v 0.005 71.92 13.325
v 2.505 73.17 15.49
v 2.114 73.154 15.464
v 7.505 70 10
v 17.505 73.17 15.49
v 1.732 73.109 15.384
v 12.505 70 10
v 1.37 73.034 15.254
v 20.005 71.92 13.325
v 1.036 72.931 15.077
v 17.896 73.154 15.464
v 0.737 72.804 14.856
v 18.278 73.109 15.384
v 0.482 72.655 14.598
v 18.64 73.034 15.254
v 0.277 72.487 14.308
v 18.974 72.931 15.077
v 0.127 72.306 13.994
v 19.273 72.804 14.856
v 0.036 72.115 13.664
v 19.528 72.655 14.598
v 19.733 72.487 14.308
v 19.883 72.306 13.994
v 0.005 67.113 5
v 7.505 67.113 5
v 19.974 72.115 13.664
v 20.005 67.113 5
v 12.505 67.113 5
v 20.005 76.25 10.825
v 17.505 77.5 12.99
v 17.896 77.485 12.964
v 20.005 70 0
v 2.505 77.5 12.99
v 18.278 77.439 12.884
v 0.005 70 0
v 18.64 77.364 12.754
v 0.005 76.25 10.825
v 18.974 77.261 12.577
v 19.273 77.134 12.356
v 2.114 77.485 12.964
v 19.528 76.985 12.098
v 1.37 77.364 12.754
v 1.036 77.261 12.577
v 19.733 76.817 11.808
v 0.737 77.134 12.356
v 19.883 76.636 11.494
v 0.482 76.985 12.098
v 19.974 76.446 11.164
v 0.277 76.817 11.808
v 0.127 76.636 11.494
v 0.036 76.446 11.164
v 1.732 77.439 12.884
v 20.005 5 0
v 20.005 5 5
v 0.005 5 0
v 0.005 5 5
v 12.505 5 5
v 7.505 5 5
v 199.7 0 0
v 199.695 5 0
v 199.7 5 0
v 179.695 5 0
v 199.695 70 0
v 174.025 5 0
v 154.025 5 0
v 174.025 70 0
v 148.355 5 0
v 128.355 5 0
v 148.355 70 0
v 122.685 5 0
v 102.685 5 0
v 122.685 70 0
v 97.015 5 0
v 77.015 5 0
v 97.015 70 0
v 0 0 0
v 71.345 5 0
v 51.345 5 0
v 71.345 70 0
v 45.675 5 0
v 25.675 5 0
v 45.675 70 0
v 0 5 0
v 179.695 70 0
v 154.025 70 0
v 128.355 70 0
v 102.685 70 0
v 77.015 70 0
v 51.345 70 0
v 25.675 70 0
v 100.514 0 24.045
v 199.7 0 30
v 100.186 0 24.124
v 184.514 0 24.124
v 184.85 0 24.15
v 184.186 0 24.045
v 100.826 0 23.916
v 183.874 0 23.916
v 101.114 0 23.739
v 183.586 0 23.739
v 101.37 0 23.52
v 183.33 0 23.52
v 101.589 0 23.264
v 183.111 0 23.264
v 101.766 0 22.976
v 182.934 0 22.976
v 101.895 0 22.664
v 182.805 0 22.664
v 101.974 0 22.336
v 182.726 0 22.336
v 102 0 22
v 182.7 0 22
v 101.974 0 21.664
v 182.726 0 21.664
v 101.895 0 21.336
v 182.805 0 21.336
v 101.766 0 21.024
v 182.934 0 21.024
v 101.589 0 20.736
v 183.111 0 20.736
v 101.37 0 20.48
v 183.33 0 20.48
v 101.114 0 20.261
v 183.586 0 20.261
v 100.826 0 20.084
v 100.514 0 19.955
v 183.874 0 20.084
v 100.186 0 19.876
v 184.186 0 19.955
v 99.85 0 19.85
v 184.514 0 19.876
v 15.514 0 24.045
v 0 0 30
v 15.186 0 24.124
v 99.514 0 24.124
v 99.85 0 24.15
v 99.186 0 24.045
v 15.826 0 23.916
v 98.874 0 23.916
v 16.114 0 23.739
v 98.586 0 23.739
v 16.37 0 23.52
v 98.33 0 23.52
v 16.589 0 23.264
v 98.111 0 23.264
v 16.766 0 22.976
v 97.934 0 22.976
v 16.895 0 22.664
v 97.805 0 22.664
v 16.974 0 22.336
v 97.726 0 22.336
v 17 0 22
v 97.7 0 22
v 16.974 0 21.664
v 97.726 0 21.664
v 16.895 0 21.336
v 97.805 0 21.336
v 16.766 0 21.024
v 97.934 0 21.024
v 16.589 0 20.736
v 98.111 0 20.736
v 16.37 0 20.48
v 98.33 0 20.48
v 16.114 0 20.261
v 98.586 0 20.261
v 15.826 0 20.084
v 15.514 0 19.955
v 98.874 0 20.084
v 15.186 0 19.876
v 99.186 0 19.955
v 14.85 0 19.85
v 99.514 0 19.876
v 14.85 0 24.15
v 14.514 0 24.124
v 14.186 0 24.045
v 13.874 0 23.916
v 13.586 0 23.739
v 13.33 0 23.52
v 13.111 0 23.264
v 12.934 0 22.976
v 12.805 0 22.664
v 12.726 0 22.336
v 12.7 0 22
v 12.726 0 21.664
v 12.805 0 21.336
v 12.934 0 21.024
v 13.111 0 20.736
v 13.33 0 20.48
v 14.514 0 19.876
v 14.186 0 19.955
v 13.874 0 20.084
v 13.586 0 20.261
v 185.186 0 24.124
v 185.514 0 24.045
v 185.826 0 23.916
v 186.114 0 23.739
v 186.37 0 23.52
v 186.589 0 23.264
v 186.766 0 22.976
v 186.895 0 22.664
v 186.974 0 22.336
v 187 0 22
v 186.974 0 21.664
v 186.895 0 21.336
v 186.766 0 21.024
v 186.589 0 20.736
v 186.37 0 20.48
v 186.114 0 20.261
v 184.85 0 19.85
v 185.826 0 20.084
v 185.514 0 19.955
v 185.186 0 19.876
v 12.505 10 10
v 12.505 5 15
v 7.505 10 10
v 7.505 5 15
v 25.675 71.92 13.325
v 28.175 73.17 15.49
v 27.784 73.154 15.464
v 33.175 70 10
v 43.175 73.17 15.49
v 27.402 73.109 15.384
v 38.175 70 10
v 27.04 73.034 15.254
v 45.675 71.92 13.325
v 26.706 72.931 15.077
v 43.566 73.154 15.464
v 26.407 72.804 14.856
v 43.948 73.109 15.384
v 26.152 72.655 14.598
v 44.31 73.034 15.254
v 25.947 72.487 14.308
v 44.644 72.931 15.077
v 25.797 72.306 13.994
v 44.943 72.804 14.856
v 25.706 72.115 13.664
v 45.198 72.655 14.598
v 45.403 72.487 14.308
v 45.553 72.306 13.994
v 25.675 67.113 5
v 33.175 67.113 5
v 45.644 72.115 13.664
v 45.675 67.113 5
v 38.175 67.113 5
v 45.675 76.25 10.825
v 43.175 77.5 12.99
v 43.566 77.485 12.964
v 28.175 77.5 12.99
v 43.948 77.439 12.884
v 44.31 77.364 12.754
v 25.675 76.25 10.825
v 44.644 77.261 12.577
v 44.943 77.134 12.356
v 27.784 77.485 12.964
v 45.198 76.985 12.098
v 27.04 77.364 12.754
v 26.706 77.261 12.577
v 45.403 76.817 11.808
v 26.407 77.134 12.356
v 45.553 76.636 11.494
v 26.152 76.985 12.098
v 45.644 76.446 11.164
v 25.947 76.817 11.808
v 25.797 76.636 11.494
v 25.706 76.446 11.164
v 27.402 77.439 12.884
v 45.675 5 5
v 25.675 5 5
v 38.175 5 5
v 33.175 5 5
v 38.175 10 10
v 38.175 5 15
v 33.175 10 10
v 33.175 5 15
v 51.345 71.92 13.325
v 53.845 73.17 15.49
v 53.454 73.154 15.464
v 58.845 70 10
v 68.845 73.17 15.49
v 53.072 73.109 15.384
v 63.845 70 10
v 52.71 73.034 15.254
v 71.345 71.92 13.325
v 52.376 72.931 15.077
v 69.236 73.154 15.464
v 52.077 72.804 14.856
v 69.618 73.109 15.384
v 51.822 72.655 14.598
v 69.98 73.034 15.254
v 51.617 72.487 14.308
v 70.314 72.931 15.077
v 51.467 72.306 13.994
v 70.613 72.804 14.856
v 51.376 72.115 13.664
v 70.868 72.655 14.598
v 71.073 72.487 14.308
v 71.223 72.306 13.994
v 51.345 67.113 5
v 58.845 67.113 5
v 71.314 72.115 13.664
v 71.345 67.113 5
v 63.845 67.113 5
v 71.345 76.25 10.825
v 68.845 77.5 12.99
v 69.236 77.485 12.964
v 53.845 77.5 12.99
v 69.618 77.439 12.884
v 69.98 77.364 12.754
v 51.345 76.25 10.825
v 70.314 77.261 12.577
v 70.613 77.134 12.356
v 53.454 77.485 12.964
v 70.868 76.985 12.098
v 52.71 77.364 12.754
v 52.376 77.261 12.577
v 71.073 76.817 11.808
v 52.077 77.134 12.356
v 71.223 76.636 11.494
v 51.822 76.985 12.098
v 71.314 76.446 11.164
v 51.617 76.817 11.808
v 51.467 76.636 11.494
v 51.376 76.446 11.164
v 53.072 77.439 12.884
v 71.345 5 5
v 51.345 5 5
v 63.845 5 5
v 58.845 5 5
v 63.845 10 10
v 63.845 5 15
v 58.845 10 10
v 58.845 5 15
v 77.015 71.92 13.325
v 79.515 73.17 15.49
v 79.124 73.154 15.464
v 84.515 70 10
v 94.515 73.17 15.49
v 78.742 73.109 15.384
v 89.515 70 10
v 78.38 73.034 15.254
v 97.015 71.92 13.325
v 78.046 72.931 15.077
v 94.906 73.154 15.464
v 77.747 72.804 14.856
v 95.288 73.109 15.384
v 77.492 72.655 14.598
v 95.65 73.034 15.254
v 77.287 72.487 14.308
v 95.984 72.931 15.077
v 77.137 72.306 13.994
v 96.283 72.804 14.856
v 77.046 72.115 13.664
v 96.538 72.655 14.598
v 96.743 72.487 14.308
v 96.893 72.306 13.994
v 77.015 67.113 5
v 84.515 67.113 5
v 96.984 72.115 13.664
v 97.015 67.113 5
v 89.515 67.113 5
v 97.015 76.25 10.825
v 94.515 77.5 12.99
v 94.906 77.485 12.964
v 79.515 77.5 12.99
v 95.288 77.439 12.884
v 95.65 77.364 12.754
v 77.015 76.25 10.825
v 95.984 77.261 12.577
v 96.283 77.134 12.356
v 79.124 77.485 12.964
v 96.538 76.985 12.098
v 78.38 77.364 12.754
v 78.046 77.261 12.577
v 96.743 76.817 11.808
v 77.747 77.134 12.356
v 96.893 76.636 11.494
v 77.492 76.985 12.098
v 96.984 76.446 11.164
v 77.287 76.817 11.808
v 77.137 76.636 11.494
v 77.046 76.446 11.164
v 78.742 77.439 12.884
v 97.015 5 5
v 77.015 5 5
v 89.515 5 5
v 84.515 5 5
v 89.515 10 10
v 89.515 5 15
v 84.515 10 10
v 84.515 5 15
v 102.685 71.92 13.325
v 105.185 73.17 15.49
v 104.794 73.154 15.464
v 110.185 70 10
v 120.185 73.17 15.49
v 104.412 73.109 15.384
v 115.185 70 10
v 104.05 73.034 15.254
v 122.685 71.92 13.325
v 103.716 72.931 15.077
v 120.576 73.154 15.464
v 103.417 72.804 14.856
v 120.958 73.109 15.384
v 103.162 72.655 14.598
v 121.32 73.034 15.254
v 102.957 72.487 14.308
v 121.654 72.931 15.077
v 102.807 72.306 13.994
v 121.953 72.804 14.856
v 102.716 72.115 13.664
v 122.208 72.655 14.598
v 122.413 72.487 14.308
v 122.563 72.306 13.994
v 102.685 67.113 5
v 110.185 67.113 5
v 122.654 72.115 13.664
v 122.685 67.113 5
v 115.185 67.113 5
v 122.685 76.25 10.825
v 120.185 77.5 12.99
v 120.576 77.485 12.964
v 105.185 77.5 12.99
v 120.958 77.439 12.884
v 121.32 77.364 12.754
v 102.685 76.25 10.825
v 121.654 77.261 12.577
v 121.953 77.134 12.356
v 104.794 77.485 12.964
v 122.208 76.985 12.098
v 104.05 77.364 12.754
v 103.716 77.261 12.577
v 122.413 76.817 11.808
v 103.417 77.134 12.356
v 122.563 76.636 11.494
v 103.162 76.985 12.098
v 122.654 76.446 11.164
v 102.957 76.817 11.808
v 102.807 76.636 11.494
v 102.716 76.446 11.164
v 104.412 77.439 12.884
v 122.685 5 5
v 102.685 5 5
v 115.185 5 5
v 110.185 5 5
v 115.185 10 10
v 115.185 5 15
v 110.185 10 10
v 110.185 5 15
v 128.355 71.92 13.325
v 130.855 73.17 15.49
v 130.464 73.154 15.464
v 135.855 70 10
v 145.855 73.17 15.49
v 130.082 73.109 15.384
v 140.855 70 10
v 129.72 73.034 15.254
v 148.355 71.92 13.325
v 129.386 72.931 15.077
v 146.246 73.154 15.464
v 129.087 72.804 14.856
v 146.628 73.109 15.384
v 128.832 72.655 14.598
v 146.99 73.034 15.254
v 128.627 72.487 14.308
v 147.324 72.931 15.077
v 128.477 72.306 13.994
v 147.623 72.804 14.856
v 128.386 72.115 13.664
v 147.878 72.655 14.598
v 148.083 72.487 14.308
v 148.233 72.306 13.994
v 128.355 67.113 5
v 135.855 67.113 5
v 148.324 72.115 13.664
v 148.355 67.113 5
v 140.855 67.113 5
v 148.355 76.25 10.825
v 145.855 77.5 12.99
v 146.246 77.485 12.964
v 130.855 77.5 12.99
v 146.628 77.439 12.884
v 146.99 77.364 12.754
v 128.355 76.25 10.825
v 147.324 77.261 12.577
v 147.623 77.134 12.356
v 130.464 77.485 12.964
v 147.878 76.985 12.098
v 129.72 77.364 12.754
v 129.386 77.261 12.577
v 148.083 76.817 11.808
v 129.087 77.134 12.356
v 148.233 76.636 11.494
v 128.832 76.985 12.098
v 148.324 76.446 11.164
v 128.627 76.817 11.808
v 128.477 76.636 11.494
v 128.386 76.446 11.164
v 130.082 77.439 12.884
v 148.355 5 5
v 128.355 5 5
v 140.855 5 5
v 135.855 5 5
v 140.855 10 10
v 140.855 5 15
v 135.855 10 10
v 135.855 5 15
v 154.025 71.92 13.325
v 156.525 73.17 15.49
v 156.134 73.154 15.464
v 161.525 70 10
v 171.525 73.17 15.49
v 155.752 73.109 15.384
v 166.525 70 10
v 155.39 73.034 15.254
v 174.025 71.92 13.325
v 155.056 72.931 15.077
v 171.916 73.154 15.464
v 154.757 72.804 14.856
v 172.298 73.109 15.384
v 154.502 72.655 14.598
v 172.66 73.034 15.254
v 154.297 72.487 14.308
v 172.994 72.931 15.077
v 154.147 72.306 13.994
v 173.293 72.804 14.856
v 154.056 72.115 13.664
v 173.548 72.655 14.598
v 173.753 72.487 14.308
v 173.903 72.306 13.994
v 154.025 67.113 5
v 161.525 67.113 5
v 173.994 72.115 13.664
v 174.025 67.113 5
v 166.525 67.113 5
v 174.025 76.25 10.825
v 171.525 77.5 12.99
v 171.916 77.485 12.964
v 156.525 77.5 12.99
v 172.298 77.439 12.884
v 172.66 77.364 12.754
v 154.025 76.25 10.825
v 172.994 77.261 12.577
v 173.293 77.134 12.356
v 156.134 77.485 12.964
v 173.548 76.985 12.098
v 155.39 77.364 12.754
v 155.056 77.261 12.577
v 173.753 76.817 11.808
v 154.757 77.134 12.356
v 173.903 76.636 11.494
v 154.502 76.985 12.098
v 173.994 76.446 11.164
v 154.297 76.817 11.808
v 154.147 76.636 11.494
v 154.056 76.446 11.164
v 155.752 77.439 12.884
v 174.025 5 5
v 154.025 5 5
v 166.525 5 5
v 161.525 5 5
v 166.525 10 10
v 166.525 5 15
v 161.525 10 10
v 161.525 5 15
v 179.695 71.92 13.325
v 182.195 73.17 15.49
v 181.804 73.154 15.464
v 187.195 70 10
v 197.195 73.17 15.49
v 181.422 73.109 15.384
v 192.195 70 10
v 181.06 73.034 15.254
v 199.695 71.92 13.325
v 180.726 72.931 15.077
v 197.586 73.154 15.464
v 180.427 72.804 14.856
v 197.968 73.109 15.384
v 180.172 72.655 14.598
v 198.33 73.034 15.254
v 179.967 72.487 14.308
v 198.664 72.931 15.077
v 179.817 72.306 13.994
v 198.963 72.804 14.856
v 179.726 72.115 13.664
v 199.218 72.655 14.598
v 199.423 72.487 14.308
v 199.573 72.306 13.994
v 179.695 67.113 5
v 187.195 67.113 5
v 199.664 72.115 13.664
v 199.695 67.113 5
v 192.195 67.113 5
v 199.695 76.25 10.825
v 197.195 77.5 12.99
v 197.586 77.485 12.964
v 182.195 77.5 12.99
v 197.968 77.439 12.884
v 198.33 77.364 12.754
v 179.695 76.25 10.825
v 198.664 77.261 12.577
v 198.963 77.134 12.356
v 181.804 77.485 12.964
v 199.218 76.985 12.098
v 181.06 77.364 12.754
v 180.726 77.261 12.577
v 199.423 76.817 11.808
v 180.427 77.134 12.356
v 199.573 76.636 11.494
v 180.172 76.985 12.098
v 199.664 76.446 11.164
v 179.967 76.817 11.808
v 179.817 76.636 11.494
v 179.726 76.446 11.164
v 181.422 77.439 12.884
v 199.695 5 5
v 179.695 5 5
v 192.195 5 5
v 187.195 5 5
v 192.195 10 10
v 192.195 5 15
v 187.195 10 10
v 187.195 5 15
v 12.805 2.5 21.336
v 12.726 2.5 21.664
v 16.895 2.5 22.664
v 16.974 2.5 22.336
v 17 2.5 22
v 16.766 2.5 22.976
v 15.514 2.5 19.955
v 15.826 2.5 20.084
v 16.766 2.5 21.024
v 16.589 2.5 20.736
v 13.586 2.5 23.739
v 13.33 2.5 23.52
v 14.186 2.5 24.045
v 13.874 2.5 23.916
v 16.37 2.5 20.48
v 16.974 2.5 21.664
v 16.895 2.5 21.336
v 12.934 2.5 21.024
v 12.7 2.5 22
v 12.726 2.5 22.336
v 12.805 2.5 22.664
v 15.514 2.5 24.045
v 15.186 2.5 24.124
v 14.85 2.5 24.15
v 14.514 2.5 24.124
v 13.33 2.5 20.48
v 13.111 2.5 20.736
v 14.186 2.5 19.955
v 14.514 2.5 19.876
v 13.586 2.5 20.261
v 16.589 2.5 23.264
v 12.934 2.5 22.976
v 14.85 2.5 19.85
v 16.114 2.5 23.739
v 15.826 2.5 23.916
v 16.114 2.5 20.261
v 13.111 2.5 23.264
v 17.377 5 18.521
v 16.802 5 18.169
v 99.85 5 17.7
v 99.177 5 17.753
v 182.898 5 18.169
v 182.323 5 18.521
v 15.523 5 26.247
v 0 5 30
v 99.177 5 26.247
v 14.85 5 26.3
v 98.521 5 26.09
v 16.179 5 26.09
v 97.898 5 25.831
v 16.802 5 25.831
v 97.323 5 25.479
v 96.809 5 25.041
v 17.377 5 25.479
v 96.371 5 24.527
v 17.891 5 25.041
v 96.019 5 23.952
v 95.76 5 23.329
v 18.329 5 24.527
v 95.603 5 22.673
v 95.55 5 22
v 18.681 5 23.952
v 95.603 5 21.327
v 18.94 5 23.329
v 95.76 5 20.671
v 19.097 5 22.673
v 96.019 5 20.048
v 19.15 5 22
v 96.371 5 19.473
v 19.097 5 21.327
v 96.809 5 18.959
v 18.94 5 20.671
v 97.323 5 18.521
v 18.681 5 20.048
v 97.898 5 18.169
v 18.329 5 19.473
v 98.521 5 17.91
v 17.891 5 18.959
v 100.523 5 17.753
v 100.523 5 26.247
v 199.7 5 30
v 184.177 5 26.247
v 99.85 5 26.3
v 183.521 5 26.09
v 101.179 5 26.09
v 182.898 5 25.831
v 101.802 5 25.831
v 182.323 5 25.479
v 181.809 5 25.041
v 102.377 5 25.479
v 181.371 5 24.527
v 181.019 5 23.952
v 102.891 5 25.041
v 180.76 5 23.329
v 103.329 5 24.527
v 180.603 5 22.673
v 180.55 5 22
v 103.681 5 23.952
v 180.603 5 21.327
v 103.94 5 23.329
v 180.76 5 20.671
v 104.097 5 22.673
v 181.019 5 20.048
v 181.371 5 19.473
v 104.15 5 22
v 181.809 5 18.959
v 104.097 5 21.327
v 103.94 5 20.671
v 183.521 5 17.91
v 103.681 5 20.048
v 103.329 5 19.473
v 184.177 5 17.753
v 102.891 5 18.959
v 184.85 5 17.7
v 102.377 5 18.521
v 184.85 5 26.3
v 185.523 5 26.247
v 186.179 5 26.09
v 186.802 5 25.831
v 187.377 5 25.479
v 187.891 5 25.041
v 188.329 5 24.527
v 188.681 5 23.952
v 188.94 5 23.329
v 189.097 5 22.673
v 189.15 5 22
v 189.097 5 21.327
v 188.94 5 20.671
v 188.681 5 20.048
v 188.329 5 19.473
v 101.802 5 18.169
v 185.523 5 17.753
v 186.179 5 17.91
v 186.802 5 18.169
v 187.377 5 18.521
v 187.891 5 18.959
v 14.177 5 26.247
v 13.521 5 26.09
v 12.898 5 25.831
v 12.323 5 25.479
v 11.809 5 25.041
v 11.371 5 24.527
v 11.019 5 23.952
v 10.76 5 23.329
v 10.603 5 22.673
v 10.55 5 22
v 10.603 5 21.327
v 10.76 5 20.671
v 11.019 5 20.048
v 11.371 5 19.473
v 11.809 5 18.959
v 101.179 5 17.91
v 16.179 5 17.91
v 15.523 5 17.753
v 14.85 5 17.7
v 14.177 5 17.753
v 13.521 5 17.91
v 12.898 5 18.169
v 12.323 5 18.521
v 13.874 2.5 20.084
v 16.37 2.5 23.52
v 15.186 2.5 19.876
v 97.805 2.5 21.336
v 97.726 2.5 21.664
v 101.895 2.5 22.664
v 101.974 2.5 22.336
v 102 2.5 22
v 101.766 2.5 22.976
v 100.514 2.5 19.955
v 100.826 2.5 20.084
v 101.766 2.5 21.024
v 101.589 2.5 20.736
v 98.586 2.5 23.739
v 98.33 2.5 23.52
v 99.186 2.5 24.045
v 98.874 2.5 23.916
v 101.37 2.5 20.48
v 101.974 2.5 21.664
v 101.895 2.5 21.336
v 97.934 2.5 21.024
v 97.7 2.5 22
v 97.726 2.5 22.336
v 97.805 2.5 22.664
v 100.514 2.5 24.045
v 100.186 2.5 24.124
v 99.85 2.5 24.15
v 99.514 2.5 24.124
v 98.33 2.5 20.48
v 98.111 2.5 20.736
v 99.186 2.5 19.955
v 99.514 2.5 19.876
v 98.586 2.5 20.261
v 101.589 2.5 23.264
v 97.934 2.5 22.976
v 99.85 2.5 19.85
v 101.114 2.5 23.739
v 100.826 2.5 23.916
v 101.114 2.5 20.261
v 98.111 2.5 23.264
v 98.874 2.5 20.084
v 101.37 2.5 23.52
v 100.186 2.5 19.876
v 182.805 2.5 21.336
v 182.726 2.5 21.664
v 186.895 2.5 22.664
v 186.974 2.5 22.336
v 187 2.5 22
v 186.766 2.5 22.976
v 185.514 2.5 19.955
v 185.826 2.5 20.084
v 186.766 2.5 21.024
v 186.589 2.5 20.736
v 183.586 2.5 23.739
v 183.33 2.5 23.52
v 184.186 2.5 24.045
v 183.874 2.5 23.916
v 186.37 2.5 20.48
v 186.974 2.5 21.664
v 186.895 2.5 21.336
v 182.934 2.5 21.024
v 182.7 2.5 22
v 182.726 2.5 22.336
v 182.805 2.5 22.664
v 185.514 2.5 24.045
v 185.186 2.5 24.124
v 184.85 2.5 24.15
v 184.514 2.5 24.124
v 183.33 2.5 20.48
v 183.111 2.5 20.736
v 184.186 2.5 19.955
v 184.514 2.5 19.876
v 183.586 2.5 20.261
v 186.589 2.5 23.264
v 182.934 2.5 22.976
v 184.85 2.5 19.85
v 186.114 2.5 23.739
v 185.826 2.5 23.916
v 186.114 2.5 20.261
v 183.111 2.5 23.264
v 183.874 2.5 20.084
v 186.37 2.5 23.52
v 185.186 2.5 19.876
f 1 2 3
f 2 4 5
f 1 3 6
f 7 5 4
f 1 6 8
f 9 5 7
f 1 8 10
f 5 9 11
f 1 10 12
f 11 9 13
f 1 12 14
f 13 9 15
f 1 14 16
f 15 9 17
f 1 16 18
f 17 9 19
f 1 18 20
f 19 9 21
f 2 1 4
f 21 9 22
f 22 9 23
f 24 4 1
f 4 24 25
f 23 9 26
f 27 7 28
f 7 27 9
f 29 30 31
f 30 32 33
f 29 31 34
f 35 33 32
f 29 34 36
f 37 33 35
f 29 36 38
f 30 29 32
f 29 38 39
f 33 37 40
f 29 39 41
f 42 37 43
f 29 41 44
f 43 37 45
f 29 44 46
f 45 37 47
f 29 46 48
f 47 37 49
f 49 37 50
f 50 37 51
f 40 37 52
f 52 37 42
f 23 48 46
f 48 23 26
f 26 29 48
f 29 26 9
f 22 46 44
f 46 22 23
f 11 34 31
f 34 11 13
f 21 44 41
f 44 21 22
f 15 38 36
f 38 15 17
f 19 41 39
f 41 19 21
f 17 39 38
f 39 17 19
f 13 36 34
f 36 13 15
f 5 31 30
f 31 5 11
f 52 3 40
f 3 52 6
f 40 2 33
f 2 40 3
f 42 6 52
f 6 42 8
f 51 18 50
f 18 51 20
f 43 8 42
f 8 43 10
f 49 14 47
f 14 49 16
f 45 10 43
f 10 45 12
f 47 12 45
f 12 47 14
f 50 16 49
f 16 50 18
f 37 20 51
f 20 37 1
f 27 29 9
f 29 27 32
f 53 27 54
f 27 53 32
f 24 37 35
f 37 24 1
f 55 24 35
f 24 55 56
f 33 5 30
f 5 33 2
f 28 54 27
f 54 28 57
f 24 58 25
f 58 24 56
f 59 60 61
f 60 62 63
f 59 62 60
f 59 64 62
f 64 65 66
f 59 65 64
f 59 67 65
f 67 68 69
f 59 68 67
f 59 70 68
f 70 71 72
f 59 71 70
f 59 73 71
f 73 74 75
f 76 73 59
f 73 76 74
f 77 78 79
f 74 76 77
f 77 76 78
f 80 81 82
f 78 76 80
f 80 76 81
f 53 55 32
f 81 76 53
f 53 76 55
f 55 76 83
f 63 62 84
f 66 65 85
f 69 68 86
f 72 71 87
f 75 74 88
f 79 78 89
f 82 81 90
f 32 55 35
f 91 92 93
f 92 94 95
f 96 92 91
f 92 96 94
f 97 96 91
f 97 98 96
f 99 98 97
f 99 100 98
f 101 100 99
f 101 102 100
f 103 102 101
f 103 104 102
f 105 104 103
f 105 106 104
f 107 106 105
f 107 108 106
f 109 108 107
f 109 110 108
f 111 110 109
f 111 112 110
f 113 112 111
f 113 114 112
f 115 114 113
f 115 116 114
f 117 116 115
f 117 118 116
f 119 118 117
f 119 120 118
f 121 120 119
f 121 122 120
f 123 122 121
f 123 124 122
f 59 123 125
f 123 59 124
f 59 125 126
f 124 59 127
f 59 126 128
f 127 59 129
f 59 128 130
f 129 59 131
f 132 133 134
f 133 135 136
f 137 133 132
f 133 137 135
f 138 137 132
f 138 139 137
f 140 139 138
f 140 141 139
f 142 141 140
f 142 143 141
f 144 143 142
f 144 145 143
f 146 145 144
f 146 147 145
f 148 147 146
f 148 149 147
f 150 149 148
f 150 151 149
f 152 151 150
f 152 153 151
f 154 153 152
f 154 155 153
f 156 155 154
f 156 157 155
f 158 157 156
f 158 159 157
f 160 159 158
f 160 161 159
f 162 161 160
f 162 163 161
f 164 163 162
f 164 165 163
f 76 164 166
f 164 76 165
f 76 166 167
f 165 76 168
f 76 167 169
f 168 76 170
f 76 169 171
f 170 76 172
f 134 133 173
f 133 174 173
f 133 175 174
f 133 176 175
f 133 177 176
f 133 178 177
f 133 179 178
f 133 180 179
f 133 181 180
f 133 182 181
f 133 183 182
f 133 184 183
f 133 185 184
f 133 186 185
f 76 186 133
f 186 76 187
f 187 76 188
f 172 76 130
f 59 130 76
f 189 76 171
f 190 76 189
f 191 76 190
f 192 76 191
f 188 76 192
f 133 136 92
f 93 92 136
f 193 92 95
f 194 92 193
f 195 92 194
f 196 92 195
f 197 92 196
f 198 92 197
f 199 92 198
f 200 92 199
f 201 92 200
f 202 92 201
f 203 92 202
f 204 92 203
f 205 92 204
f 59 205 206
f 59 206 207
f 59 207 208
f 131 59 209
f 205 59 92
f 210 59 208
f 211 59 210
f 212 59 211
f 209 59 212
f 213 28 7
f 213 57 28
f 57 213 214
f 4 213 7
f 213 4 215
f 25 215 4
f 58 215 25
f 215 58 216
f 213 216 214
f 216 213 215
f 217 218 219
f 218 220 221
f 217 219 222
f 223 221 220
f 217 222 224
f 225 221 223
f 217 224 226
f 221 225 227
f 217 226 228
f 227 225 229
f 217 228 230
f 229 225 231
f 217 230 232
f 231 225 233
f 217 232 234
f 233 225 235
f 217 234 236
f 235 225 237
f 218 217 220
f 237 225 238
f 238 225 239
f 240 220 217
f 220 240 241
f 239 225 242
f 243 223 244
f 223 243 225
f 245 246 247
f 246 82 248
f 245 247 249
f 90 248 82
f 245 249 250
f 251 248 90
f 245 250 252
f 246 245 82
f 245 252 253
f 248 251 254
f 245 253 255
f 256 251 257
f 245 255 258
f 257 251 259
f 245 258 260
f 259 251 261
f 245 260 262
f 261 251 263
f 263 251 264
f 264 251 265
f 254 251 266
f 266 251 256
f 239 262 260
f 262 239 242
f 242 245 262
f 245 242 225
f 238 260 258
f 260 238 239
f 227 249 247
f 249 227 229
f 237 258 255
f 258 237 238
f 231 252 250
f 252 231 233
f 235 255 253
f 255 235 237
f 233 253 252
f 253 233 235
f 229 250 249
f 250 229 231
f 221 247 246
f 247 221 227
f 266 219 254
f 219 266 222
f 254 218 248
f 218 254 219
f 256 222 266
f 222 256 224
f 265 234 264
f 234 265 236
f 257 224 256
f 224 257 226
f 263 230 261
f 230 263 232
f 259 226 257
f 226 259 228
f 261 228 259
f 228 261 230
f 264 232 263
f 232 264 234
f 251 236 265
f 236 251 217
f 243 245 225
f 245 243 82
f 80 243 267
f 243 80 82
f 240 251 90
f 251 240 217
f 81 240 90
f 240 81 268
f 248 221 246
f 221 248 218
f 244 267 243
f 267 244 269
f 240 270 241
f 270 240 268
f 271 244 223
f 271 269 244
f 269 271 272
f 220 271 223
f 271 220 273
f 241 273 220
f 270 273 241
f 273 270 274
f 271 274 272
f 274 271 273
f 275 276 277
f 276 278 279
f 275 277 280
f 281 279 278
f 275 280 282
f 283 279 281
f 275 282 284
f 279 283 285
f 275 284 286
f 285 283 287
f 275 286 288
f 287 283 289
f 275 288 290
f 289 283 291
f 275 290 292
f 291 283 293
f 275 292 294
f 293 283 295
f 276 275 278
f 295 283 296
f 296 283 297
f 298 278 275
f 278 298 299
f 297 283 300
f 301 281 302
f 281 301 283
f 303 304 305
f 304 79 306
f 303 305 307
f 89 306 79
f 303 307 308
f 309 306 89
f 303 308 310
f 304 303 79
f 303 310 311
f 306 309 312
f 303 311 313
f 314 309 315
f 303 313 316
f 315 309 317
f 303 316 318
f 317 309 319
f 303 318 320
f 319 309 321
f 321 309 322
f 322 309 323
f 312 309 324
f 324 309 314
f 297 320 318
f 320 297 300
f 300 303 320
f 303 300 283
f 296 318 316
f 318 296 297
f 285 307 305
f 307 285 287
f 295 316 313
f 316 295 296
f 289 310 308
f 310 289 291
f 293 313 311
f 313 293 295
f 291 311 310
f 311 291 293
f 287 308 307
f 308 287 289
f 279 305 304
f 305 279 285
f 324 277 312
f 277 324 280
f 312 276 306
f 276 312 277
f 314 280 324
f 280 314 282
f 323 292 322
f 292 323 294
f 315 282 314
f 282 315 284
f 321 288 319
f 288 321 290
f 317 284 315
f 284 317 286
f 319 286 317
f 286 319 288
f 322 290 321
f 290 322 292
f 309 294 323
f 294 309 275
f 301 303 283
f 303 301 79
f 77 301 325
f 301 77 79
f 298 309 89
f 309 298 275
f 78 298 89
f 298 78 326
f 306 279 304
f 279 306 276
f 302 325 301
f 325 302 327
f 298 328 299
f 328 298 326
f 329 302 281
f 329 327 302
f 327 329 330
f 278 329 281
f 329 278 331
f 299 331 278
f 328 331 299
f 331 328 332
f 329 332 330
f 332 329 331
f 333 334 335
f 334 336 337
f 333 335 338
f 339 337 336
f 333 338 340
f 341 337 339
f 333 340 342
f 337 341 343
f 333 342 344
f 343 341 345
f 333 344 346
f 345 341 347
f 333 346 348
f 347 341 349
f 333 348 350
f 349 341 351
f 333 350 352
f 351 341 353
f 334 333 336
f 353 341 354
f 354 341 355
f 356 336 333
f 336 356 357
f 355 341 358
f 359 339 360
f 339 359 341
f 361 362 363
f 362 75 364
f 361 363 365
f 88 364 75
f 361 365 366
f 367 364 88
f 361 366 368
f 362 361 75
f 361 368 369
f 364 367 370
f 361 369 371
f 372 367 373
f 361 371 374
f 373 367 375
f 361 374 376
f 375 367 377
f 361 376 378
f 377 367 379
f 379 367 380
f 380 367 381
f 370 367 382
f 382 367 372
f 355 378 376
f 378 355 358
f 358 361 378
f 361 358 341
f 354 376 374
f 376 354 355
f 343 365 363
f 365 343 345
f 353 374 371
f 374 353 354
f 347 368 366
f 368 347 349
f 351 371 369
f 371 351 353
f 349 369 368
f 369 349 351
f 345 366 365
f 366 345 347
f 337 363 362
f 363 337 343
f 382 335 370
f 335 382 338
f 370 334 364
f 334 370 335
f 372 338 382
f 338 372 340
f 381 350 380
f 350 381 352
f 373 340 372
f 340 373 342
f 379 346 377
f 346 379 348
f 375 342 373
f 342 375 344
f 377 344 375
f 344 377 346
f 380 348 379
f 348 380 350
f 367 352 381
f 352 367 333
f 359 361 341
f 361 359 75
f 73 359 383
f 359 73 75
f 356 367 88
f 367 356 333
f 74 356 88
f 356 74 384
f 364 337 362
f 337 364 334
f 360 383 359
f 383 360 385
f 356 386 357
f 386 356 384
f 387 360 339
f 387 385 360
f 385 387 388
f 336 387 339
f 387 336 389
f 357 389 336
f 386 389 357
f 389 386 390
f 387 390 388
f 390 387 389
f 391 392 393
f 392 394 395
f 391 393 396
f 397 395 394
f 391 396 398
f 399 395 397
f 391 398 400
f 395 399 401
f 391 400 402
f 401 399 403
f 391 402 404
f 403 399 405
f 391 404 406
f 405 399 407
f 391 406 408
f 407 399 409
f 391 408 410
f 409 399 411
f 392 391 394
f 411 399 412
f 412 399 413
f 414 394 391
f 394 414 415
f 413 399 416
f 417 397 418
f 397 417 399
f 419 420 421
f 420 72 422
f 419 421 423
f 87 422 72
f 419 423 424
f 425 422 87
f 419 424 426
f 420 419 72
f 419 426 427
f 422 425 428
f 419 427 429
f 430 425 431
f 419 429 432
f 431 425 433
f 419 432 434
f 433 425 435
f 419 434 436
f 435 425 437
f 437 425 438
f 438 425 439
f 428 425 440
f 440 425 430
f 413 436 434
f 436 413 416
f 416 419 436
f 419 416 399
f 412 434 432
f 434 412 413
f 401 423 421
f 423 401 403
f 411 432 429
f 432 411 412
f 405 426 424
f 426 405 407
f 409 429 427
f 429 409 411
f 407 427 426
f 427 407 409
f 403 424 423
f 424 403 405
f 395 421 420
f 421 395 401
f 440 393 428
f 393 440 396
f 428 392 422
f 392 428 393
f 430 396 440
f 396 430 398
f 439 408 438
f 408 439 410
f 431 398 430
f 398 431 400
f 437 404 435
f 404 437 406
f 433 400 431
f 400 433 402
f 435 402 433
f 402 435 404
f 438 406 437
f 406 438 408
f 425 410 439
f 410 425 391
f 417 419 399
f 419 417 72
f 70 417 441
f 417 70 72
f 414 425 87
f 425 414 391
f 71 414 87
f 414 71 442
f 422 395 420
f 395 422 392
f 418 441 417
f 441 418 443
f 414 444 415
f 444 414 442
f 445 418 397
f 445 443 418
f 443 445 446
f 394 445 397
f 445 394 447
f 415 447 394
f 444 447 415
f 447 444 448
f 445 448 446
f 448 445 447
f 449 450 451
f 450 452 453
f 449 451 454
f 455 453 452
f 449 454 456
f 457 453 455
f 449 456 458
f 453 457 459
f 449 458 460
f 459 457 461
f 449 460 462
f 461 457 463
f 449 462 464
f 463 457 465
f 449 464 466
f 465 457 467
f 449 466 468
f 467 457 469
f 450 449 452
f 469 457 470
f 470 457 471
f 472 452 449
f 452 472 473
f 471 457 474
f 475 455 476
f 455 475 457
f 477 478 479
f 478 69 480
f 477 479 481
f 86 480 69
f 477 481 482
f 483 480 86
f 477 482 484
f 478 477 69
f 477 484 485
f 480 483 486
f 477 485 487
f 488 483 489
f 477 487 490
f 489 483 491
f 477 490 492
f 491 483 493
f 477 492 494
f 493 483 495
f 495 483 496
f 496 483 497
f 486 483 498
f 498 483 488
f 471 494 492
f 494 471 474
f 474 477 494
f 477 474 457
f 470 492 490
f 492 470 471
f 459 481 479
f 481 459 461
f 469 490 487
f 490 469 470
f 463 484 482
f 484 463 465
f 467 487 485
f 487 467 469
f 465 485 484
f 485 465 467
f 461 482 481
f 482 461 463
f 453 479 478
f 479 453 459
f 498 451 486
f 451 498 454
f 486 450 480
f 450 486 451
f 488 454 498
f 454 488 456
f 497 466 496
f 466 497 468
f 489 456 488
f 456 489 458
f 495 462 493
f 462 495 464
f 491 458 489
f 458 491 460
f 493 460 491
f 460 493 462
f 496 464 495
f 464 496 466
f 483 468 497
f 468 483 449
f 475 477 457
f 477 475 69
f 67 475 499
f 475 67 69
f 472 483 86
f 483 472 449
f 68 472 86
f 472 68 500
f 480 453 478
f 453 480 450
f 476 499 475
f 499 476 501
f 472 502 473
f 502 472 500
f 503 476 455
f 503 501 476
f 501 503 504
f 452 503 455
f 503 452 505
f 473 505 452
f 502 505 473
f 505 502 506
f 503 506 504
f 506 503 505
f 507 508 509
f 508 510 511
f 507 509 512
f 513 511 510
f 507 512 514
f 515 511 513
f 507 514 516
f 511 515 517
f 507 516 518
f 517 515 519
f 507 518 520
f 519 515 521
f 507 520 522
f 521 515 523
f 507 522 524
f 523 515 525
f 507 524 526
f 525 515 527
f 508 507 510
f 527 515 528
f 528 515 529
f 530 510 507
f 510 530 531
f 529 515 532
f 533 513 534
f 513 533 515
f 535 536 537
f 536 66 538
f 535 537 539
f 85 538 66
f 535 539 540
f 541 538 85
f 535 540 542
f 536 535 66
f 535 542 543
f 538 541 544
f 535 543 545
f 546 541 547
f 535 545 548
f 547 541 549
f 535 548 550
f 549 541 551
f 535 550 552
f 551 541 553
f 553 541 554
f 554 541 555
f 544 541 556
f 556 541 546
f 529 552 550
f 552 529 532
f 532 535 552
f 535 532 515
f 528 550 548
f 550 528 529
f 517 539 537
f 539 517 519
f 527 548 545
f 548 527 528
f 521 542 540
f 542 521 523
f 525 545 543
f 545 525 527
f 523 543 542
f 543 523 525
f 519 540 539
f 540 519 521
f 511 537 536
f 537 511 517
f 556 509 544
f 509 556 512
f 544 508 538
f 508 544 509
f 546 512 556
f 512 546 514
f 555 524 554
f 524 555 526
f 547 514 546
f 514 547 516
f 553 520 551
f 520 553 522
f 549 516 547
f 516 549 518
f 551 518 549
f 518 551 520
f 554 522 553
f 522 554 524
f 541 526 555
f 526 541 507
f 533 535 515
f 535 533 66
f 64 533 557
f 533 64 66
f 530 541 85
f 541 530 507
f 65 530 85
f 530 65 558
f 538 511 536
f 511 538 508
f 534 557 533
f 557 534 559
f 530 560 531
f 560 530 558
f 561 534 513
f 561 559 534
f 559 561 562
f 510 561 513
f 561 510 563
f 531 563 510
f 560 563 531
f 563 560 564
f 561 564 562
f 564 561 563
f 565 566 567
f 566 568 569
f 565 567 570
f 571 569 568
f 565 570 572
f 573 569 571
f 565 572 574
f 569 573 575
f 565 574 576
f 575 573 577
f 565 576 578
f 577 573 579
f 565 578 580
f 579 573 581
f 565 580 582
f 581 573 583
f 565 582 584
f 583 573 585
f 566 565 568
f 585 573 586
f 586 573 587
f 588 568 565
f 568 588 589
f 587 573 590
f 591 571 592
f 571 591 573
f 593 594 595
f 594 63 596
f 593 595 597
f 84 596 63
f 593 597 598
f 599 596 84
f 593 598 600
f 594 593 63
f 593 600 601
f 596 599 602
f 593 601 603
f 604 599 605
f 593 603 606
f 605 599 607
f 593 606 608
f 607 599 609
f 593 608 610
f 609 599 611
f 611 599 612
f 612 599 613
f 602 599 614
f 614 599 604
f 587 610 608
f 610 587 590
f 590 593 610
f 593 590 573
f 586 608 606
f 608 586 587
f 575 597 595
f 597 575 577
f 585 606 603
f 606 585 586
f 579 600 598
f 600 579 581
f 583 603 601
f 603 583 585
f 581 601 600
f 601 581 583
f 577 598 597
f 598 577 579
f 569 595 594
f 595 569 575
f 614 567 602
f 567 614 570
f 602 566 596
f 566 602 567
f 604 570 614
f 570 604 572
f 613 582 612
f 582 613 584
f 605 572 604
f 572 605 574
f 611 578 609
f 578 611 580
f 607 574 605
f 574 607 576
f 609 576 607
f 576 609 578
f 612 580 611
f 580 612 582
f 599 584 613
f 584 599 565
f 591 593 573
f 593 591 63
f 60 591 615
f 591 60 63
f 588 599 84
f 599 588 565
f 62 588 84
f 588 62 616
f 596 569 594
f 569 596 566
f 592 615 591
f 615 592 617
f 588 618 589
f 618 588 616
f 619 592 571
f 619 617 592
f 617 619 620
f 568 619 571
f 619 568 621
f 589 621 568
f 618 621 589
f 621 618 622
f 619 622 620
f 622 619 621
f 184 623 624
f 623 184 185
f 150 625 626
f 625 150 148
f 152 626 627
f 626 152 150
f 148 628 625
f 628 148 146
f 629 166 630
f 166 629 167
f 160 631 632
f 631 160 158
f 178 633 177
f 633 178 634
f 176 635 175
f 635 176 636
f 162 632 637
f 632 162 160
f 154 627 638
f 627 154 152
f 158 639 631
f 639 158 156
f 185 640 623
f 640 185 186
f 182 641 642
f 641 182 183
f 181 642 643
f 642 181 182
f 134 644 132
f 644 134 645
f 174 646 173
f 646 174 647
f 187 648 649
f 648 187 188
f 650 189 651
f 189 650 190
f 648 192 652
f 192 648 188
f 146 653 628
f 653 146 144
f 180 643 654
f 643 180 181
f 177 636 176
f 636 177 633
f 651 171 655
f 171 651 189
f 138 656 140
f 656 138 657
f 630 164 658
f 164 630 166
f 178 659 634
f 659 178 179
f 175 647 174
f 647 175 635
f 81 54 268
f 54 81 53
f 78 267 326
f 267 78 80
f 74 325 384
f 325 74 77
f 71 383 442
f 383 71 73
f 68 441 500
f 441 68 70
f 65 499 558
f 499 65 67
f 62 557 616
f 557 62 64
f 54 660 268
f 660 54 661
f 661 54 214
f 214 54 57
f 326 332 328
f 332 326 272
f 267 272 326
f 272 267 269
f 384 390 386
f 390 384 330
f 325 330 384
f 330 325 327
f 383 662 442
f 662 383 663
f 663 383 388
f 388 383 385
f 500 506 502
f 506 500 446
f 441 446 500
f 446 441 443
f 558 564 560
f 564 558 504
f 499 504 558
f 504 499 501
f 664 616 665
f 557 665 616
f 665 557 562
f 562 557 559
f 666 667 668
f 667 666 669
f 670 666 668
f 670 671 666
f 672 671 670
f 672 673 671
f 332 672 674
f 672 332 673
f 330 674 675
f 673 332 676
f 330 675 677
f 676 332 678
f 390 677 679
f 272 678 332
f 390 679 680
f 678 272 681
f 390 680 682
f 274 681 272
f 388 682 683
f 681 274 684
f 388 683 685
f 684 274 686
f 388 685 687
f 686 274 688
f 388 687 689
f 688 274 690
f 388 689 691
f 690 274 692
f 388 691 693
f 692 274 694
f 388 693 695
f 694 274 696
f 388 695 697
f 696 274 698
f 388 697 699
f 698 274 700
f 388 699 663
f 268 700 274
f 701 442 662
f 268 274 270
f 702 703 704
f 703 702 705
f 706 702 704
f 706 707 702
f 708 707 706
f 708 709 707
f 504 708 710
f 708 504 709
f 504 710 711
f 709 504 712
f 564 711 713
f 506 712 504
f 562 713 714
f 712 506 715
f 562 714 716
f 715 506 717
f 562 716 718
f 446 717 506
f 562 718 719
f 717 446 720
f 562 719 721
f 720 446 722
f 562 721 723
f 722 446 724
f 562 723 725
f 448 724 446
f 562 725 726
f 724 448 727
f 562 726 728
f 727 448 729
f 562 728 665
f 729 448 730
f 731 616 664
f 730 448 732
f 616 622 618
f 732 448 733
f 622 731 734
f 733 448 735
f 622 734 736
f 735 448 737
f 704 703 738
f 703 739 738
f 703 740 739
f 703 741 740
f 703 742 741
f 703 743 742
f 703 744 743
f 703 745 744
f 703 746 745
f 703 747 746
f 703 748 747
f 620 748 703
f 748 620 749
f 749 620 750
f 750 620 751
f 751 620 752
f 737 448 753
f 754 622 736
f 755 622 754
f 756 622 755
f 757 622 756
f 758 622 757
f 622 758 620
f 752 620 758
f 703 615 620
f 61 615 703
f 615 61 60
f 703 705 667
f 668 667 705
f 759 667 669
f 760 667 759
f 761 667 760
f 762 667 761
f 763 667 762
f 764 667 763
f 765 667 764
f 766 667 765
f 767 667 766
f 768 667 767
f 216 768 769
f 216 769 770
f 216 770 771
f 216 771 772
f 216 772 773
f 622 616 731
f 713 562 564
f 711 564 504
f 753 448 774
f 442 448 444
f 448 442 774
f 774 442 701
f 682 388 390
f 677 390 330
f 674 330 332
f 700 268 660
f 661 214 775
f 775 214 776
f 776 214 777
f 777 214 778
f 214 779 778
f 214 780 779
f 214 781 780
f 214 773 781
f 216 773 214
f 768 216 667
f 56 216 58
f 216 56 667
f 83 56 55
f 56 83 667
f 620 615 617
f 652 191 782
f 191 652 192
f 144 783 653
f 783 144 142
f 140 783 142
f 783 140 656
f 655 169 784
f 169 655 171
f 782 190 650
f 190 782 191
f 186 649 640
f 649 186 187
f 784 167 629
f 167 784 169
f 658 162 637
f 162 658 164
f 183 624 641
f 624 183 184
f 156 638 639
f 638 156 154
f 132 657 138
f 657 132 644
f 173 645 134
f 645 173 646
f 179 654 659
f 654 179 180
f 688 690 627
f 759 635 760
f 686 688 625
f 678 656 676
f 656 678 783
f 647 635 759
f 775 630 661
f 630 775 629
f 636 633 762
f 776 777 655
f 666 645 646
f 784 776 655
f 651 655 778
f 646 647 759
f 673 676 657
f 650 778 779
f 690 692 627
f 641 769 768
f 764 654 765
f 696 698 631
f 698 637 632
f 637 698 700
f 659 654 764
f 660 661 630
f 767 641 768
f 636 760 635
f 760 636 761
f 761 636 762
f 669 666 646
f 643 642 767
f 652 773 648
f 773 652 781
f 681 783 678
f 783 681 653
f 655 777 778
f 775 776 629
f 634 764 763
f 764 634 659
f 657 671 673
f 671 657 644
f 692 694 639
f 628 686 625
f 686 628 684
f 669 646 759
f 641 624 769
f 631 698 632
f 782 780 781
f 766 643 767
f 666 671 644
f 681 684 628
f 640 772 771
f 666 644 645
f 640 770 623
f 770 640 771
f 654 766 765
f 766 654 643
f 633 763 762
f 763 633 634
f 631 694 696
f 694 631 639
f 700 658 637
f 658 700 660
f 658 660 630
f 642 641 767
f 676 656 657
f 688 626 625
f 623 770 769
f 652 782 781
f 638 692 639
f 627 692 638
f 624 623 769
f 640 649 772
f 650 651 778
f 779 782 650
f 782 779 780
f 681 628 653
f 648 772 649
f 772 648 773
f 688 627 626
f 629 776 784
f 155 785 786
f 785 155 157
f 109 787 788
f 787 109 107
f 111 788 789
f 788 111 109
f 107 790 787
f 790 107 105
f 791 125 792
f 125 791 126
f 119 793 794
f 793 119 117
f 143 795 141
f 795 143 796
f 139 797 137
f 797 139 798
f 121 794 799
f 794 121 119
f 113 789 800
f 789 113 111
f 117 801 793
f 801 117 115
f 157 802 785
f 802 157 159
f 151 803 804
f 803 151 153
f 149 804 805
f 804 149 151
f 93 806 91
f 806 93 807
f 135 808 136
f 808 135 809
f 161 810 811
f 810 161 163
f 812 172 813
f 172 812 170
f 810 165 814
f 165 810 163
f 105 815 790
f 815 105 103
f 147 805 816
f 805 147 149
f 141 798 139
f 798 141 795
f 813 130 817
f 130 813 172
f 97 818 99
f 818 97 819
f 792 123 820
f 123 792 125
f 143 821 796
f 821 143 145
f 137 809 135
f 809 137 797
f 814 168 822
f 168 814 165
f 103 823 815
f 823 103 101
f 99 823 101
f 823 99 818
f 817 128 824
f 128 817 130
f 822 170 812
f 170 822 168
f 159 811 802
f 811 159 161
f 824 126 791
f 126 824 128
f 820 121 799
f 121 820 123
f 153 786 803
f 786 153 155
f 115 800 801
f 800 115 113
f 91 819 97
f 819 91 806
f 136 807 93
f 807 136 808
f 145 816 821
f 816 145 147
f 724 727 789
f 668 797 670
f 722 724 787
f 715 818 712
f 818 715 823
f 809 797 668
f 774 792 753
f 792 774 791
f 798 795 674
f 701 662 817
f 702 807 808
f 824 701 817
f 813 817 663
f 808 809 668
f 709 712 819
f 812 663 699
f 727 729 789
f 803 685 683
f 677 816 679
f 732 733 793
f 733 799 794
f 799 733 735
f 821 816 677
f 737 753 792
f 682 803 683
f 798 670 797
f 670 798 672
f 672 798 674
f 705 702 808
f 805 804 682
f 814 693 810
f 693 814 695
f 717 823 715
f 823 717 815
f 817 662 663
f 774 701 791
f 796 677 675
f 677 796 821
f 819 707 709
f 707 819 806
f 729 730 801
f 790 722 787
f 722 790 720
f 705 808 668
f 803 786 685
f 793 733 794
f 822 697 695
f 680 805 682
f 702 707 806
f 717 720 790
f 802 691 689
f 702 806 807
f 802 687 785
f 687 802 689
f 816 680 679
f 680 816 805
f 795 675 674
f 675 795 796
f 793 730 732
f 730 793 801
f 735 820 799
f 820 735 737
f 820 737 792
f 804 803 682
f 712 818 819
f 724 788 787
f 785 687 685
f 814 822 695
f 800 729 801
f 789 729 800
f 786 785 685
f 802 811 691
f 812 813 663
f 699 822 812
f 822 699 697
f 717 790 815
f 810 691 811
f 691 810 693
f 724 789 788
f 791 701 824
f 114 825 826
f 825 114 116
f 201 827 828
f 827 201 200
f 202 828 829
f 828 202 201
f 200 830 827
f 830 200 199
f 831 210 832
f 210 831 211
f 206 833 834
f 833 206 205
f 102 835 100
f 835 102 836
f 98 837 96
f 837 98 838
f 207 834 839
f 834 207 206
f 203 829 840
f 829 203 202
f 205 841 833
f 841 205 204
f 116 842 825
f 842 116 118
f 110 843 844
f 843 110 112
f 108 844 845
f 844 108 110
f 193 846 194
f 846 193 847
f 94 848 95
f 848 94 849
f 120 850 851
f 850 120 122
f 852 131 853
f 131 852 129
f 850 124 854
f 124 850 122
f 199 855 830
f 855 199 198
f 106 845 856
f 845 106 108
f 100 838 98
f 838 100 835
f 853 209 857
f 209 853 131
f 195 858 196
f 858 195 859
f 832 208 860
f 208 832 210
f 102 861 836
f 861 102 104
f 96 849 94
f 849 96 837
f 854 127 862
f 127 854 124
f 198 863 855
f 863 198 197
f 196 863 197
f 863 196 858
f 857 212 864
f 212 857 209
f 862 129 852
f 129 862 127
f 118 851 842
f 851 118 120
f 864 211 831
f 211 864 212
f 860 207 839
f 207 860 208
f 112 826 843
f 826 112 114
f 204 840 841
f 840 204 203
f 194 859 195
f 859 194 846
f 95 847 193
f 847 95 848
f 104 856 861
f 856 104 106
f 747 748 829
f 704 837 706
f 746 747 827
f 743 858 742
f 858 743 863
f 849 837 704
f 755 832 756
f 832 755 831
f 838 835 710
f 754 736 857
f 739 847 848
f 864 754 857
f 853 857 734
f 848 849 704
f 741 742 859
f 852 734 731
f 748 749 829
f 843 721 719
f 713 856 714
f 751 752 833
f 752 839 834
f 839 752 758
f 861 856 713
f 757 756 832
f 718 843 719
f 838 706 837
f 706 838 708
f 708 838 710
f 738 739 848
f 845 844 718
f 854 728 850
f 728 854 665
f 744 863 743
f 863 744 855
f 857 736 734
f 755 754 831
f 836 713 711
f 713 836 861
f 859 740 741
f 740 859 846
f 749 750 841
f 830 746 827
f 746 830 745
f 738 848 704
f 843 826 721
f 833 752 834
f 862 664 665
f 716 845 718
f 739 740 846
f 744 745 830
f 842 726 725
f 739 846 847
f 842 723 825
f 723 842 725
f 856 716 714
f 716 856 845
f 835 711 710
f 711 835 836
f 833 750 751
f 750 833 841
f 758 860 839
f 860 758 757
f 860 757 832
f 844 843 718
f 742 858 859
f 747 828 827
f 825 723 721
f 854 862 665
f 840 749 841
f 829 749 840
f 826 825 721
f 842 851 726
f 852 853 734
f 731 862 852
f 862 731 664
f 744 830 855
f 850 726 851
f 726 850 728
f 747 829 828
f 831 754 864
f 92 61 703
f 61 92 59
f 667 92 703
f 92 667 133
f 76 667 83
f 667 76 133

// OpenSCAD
$fn = 40;

//printing error
e = 0.3;
// strength
s = 5;

//total length
tl = 200-e;
//total height
th = 30;

// number of elements
n = 8;
//width of element
w = 20;
//length of element
l = 70;

// cable width
cw = 5.07+e*2;

// number of holes
nh = 3;
// hole diameter
hd = 4+e;
//hole distance
hdist = 85;
//hole margin top
hmt = 8;




module sr_cube(size=[1,1,1],radius=0.5,corners=[1,1,1,1]) {
    difference(){    
    cube(size);
    
        if(corners[0])
        translate([radius,radius,0])rotate([0,0,180])difference(){
                cube([radius*2,radius*2,size[2]]);
                cylinder(size[2],radius,radius);
        }
        if(corners[1])
        translate([size[0]-radius,radius,0])rotate([0,0,270])difference(){
                cube([radius*2,radius*2,size[2]]);
                cylinder(size[2],radius,radius);
        }
        if(corners[2])
        translate([size[0]-radius,size[1]-radius,0])rotate([0,0,0])difference(){
                cube([radius*2,radius*2,size[2]]);
                cylinder(size[2],radius,radius);
        }
        if(corners[3])
        translate([radius,size[1]-radius,0])rotate([0,0,90])difference(){
                cube([radius*2,radius*2,size[2]]);
                cylinder(size[2],radius,radius);
        }
        }
        
}



module hook() {
    translate([0,0,0]) {
        cube([w,l,s]);
        translate([w/2-s/2,0,s]) cube([s,l,s]);
        translate([0,l,0]) rotate([60,0,0]) sr_cube([w,s*3,s],radius=s/2,corners=[0,0,1,1]);
        translate([w/2+s/2,0,s*2]) rotate([0,-90,0]) linear_extrude(s)polygon([[0,0],[0,s*2],[s*2,0]]);
    }
}

translate([(tl-w*n-cw*(n-1))/2,0,0]) {
    for(i = [0:1:n-1]) {
        translate([i*(w+cw),0,0]) hook();
    }
}

difference() {
    cube([tl,s,th]);
    translate([(tl-hdist*(nh-1))/2,0,0])
    for(i = [0:1:nh-1]) {
        translate([i*hdist,s,th-hmt])rotate([90,0,0]) {
            cylinder(s,hd/2,hd/2);
            cylinder(s/2,hd,hd/2);
            }
        
    }



}
